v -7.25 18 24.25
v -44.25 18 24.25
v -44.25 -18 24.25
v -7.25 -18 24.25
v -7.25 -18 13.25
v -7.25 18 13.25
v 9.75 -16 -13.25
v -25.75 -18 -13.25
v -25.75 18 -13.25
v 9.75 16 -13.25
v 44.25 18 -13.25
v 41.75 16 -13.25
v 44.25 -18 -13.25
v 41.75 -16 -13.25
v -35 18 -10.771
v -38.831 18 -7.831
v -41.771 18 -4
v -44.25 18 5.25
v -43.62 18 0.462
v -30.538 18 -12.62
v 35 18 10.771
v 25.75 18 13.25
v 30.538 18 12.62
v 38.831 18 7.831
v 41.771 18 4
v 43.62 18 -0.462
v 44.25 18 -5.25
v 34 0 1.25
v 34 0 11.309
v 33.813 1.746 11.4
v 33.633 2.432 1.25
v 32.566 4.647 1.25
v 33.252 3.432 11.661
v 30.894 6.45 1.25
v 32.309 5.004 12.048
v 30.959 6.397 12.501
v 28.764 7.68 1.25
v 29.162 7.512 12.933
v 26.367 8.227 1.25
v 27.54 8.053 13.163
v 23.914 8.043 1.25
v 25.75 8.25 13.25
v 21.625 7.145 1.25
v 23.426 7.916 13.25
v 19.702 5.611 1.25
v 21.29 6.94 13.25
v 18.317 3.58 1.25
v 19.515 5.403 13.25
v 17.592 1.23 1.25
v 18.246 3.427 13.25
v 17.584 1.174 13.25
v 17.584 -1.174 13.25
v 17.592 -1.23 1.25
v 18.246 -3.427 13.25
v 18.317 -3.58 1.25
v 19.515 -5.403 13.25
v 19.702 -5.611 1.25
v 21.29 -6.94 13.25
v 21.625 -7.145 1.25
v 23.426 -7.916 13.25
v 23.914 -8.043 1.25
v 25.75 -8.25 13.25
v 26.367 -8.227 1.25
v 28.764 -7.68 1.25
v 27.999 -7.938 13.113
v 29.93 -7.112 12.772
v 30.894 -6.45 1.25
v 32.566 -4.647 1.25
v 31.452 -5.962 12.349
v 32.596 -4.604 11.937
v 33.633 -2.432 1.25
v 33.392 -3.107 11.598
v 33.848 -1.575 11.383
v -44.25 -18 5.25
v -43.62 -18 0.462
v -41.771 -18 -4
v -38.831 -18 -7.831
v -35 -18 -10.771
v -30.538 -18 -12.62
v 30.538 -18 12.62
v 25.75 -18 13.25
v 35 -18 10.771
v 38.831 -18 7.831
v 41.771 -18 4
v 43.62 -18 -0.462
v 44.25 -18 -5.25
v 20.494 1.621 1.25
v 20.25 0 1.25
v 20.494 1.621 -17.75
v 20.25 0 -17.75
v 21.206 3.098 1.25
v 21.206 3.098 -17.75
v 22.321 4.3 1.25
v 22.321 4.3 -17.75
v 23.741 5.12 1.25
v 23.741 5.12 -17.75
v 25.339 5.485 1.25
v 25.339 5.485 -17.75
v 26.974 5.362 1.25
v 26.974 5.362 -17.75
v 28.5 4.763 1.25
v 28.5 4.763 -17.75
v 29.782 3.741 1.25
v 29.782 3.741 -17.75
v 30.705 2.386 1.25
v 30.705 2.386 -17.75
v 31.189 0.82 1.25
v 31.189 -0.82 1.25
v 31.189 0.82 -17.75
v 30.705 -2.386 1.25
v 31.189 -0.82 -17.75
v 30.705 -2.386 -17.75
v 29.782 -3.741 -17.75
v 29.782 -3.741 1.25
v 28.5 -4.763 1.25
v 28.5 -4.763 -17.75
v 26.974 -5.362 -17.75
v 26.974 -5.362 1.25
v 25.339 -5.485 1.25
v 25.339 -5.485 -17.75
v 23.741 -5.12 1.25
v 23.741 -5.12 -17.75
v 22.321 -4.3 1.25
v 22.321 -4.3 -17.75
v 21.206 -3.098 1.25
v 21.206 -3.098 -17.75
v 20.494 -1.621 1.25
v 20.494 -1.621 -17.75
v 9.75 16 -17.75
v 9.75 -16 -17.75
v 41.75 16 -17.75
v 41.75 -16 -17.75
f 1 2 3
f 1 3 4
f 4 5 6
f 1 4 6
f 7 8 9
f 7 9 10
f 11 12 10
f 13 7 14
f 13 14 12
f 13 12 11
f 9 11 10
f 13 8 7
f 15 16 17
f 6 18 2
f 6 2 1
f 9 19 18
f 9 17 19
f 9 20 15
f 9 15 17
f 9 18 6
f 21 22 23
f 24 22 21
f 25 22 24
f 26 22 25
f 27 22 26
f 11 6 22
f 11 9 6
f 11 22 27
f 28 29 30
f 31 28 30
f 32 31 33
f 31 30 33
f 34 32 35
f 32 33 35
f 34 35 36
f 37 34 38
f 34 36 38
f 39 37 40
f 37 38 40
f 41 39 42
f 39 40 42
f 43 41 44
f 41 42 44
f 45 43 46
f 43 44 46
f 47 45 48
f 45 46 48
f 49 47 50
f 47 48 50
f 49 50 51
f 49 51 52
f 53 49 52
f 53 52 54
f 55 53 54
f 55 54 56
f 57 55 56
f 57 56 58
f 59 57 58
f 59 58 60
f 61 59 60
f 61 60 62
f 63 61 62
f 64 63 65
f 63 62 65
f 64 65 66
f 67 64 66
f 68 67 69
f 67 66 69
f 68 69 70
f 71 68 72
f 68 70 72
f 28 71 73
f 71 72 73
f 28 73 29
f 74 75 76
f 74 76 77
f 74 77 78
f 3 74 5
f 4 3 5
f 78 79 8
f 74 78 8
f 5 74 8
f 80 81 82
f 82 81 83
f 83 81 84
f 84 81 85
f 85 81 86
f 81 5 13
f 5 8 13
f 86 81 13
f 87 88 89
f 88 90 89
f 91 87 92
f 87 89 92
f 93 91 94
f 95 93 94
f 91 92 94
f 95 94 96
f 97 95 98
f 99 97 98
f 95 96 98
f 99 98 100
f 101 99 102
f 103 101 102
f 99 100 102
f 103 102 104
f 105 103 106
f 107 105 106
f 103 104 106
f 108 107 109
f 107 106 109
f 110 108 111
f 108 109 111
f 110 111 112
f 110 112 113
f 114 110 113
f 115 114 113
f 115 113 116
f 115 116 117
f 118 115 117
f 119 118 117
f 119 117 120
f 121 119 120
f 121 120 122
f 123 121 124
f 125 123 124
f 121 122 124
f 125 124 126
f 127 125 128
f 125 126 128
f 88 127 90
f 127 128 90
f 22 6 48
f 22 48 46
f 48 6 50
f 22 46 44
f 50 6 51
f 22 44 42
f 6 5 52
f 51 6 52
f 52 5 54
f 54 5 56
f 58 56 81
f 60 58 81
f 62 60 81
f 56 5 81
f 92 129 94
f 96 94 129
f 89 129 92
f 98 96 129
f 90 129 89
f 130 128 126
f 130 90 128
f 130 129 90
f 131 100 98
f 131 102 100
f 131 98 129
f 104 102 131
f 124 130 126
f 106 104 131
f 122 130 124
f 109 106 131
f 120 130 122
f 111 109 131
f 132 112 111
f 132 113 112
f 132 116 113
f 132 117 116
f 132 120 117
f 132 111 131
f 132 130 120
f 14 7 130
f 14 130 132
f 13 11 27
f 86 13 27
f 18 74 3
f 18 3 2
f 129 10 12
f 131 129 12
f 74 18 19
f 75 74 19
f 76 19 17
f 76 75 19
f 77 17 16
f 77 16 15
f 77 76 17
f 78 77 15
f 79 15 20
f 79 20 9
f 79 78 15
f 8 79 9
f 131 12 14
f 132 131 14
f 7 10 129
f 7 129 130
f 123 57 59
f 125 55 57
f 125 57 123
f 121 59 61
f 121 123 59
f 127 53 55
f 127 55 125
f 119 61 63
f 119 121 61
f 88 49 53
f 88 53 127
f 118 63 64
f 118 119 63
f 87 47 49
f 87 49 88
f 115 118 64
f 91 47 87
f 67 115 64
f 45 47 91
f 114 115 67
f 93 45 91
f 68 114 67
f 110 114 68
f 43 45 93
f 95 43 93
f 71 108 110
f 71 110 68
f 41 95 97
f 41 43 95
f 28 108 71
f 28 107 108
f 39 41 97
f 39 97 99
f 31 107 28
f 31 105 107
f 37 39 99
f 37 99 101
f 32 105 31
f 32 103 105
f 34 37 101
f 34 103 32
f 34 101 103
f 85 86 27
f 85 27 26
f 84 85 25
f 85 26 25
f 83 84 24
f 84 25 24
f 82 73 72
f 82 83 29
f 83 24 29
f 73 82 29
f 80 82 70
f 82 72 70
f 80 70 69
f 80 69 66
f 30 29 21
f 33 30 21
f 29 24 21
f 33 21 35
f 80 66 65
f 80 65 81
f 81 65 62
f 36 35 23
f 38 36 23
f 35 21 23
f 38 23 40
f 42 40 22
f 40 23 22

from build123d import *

# Parameters (mm, degrees)
F0_W           = 88.5
F0_H           = 26.5
F1_DEPTH       = 18
F2_W           = 37
F2_H           = 36
F3_DEPTH       = 11
F4_R           = 18.5
F6_W           = 32
F6_H           = 32
F7_DEPTH       = 4.5
F8_D           = 11
F8_CBORE_D     = 16.5
F8_CBORE_DEPTH = 12


with BuildPart() as f1:
    # F0 (on Front) → F1 (new body, symmetric)
    with BuildSketch(Plane.XZ):
        Rectangle(F0_W, F0_H)
    extrude(amount=F1_DEPTH, both=True)

    # F2 (on face) → F3 (join)
    with BuildSketch(Plane.XY.offset(13.25)):
        with Locations((-25.75, 0)):
            Rectangle(F2_W, F2_H)
    extrude(amount=F3_DEPTH)

    # F4
    f4_edges = [f1.edges().sort_by_distance(p)[0] for p in [
        (44.25, 0, 13.25),
        (-44.25, 0, -13.25),
    ]]
    fillet(f4_edges, radius=F4_R)

    # F6 (on face) → F7 (join)
    with BuildSketch(Plane(origin=(0, 0, -13.25), x_dir=(1, 0, 0), z_dir=(0, 0, -1))):
        with Locations((25.75, 0)):
            Rectangle(F6_W, F6_H)
    extrude(amount=F7_DEPTH)

    # F8 (through all)
    with Locations(Plane.XY.offset(13.25)):
        with Locations((25.75, 0)):
            CounterBoreHole(F8_D / 2, F8_CBORE_D / 2, F8_CBORE_DEPTH)


solid = f1.part
